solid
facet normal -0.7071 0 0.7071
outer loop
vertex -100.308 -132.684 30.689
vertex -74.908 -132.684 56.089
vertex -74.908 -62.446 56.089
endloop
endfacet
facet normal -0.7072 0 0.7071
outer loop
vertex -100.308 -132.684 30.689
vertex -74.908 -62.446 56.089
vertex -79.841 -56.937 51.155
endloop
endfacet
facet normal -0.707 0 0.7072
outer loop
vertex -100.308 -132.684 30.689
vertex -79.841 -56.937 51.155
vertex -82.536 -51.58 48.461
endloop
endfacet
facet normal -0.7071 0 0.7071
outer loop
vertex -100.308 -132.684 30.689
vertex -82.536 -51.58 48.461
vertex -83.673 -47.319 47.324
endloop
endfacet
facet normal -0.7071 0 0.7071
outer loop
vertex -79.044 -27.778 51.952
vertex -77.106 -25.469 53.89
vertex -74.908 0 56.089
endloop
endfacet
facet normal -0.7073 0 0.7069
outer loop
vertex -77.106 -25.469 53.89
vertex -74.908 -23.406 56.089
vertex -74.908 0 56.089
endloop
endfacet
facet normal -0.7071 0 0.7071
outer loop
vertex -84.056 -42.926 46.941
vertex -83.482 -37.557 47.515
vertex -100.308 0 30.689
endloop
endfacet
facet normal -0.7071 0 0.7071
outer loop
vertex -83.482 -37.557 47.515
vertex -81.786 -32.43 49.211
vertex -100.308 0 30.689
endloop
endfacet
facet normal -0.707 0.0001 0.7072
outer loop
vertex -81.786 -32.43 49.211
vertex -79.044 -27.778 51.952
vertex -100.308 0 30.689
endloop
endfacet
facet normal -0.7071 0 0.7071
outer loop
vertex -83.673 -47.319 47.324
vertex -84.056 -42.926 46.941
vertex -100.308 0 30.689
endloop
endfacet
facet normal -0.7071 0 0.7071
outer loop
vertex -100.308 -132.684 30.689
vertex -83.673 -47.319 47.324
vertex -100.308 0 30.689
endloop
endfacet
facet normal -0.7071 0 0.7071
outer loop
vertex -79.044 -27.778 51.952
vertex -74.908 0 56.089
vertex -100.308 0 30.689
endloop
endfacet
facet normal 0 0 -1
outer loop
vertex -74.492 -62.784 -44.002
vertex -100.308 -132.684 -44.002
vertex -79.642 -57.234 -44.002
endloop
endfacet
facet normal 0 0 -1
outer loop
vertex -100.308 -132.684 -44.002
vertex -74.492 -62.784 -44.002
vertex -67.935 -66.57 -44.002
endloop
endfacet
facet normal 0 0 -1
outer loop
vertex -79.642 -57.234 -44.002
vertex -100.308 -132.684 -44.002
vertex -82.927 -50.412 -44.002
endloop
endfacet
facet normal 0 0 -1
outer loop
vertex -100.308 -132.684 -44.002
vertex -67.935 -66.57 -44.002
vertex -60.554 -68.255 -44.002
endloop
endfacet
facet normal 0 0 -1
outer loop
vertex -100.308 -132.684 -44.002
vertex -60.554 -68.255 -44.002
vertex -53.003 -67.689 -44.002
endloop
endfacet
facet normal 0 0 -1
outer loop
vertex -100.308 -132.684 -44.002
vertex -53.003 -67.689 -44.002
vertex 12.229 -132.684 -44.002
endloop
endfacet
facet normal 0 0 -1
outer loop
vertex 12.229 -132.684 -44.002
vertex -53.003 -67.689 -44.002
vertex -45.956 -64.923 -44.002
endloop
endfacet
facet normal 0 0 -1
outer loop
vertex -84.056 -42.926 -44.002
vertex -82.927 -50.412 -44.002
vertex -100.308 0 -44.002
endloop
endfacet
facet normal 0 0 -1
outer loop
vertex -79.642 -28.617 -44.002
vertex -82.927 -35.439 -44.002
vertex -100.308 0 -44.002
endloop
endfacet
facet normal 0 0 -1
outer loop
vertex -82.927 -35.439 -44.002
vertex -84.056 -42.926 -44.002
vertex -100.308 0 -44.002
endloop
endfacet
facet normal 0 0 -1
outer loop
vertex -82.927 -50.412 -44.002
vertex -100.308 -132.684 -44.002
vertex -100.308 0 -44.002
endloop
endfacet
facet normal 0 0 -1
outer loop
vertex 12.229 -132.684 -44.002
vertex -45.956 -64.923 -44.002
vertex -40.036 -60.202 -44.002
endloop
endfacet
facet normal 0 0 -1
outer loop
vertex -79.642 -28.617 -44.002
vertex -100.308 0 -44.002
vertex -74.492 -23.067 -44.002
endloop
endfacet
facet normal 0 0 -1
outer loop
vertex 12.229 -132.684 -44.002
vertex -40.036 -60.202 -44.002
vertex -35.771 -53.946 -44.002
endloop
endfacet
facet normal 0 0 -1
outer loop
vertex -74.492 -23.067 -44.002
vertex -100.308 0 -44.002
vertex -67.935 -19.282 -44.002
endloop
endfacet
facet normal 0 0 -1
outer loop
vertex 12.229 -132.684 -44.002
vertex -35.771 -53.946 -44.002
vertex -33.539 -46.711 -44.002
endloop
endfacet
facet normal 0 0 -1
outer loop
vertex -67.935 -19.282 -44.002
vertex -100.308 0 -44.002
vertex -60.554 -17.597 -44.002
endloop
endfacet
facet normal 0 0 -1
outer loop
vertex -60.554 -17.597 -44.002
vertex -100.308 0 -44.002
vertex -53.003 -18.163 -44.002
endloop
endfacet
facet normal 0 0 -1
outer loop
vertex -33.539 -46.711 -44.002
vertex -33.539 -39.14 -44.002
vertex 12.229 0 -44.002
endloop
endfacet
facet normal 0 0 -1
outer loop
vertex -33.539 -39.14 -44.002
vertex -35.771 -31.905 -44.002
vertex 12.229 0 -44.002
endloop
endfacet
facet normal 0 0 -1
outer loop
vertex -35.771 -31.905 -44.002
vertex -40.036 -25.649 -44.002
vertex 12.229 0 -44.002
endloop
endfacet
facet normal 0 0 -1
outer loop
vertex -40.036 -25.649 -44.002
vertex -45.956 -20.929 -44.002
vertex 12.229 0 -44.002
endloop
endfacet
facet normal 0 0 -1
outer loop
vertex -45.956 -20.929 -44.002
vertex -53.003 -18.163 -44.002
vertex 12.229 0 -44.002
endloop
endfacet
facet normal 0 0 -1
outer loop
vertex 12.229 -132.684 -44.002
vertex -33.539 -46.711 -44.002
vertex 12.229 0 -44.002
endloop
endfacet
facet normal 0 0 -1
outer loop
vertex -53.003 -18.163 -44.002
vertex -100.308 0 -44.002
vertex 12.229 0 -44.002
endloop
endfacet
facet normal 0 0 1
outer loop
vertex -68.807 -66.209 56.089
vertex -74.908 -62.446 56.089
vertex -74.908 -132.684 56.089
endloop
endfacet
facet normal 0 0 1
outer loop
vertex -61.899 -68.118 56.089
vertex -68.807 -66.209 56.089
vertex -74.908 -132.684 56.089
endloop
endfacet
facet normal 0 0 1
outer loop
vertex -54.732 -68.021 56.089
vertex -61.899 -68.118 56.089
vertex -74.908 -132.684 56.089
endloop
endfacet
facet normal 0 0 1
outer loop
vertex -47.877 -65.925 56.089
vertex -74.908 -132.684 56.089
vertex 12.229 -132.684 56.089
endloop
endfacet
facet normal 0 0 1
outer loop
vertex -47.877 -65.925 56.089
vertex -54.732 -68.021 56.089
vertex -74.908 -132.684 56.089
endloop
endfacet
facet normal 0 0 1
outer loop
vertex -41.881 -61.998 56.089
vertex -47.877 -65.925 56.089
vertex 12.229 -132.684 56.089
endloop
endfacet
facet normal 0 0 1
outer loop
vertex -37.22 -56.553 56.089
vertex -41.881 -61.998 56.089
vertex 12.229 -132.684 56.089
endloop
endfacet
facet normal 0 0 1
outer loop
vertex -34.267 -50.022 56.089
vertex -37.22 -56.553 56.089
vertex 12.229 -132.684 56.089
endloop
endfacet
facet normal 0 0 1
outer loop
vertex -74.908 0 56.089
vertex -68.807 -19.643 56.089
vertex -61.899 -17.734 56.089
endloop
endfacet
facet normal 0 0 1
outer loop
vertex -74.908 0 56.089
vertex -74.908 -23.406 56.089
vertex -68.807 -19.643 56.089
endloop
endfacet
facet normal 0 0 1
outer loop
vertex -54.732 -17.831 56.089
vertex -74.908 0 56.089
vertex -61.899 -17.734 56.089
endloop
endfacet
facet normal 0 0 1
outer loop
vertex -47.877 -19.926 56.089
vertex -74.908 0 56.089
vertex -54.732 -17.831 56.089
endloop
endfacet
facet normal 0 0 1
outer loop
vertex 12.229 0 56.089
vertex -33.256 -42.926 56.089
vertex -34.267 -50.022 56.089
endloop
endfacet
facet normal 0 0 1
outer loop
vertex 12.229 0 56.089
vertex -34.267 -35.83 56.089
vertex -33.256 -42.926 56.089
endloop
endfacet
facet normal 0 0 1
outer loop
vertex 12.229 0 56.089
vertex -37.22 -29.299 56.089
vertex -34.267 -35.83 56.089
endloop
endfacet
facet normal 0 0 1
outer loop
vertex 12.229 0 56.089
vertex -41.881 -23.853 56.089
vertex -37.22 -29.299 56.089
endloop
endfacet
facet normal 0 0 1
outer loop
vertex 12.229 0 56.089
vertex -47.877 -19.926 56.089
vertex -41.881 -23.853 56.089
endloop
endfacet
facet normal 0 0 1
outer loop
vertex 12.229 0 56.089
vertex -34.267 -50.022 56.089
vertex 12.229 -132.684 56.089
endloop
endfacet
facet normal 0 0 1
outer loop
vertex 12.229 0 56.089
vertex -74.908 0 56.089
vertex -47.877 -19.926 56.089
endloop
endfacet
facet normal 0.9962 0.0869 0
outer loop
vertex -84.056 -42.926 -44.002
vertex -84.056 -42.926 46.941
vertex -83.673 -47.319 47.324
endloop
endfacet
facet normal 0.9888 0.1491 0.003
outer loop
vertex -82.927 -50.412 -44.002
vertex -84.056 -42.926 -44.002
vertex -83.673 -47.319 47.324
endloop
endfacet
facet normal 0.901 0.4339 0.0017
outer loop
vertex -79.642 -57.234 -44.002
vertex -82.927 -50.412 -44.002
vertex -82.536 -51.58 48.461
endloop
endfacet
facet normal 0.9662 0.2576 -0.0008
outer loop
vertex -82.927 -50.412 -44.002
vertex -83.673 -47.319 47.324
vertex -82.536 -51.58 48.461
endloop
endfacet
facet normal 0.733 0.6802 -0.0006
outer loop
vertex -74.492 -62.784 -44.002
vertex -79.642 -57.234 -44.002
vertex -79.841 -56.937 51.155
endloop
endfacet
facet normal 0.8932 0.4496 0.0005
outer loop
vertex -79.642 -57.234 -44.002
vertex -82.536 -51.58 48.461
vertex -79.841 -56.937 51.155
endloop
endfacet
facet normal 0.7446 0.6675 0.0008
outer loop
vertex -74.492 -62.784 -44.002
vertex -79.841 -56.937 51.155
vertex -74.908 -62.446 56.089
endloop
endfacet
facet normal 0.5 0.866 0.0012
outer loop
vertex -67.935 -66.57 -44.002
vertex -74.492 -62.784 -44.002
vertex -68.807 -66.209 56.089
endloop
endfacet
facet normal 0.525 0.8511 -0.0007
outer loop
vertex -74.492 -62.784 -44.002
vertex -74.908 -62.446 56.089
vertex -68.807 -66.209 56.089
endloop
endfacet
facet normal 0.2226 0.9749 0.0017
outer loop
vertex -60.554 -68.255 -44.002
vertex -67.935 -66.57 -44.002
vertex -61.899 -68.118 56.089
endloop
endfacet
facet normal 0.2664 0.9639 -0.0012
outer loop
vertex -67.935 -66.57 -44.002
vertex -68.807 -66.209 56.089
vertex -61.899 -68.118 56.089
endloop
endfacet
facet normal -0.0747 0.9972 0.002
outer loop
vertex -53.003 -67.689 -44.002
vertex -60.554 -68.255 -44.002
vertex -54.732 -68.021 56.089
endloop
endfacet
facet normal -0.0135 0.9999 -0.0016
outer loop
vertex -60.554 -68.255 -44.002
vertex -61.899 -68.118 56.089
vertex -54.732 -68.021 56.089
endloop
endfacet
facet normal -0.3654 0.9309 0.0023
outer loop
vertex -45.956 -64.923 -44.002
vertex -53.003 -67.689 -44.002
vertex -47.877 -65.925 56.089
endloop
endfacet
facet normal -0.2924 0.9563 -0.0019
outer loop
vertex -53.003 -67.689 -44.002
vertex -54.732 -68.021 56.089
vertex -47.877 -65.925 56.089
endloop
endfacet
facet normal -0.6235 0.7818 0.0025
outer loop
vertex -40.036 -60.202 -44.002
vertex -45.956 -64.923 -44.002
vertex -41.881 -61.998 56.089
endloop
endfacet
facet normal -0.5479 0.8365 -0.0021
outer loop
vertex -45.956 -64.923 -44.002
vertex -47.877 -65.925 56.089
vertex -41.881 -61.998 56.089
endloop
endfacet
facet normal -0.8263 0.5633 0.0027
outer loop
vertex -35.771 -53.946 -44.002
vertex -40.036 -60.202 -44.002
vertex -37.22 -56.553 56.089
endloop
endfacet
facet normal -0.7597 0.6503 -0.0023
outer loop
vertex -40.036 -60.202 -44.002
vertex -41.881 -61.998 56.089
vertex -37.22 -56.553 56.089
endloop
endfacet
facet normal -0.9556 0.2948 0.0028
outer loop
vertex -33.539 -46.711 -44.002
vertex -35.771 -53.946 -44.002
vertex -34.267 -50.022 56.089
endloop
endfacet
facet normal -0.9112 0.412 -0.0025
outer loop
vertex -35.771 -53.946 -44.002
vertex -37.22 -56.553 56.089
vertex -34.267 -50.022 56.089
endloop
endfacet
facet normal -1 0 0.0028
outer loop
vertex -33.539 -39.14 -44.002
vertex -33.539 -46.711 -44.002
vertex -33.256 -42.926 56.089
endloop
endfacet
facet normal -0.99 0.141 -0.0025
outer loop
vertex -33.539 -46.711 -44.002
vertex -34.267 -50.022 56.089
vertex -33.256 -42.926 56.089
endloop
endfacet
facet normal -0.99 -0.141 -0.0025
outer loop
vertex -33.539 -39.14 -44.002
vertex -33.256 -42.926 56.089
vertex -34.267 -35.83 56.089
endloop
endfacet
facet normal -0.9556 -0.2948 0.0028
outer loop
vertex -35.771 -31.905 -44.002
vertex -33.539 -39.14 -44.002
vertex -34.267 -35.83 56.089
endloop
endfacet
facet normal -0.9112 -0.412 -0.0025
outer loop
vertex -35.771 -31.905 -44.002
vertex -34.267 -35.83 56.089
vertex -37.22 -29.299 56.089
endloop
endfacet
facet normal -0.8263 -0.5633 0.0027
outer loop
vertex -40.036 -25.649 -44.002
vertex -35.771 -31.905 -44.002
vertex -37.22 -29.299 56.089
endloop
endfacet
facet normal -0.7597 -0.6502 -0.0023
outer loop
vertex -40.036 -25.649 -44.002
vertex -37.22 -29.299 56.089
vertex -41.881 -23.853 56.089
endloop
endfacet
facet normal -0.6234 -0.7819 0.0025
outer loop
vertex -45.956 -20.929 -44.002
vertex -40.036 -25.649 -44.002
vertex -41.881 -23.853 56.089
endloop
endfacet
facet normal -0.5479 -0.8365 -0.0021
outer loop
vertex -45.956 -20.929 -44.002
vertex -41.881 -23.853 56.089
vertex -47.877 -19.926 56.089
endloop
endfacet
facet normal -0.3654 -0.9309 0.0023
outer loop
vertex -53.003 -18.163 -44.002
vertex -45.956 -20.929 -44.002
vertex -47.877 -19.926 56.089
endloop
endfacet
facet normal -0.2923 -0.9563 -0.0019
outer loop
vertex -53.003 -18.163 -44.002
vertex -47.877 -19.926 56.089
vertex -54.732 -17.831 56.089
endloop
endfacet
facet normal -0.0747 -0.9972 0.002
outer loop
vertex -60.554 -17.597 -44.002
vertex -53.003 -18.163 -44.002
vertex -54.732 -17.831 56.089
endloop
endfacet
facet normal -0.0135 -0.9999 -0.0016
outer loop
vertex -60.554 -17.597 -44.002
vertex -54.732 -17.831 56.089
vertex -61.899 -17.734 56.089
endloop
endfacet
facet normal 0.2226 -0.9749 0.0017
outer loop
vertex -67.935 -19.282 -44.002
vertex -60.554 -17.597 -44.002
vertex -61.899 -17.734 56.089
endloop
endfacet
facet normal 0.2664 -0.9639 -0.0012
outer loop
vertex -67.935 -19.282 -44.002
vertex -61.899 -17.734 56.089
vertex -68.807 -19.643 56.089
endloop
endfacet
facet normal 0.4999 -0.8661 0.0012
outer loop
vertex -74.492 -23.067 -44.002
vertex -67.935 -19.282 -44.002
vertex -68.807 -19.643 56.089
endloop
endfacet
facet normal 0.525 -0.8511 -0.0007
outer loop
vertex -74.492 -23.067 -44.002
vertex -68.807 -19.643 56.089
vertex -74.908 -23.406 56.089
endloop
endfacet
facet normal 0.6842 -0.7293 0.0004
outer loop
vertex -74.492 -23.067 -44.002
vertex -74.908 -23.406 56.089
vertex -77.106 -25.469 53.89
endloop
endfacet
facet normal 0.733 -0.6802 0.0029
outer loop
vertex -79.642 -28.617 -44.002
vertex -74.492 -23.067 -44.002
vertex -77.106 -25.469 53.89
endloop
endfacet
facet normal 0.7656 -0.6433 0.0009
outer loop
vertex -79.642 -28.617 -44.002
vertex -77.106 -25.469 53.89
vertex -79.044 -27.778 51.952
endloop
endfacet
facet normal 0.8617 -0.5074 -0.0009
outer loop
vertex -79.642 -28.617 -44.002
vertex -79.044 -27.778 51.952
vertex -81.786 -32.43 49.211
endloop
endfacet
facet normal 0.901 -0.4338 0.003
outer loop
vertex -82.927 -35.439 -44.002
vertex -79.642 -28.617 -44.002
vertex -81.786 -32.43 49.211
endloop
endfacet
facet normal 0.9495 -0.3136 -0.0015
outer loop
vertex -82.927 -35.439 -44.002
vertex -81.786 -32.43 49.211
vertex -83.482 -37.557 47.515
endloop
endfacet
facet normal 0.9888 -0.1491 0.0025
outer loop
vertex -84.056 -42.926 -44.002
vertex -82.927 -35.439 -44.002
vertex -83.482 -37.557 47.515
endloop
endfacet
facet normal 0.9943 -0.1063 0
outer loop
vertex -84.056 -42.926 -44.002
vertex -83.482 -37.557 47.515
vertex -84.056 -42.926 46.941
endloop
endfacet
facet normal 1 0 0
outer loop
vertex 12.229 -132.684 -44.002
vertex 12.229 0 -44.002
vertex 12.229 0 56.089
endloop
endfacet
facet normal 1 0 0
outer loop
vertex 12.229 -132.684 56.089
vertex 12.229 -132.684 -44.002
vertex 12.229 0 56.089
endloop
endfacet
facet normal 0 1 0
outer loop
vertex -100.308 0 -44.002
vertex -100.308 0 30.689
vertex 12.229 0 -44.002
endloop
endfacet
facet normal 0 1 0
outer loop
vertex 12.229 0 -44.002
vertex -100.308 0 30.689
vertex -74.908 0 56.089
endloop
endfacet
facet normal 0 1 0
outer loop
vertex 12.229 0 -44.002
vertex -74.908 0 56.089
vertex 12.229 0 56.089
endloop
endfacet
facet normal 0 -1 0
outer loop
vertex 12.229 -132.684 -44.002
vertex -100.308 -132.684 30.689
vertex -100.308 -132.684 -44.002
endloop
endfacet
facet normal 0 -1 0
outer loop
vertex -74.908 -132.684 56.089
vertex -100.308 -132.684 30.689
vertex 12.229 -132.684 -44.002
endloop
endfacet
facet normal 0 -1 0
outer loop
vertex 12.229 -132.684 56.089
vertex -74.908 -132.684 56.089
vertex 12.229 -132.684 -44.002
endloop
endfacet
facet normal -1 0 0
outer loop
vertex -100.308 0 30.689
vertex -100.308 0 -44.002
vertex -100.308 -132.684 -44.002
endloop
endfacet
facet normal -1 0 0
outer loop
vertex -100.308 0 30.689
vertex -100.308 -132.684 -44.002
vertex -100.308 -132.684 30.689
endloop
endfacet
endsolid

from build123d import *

# Parameters (mm, degrees)
F0_W        = 112.5368224457
F0_H        = 100.0910364091
F1_DEPTH    = 132.68445
F3_D        = 50.8
F4_T1_DEPTH = 263.3259457887


# Not quite as in the source:
# - a fillet or chamfer that OpenCascade refuses, or shapes differently, is made with other operations: its cross-section is extruded or revolved along the edge and cut away or added


with BuildPart() as f1:
    # F0 (on Front) → F1 (new body)
    with BuildSketch(Plane.XZ):
        with Locations((-44.0393215977, 6.0430746526)):
            Rectangle(F0_W, F0_H)
    extrude(amount=F1_DEPTH)

    # F3 (through all)
    with Locations(Plane(origin=(0, 0, -44.002443552), x_dir=(1, 0, 0), z_dir=(0, 0, -1))):
        with Locations((-58.6555227637, 42.9257005453)):
            Hole(F3_D / 2)

    # F4: chamfer of 25.4 on 1 edges, made by hand

    # F4_s2 → F4_t1 (cut)
    with BuildSketch(Plane.XZ.offset(-65.3207478943)):
        Polygon((-74.9077328205, 56.0885928571), (-100.3077328205, 30.6885928571), (-100.3077328205, 56.0885928571), align=None)
    extrude(amount=F4_T1_DEPTH, mode=Mode.SUBTRACT)


solid = f1.part
